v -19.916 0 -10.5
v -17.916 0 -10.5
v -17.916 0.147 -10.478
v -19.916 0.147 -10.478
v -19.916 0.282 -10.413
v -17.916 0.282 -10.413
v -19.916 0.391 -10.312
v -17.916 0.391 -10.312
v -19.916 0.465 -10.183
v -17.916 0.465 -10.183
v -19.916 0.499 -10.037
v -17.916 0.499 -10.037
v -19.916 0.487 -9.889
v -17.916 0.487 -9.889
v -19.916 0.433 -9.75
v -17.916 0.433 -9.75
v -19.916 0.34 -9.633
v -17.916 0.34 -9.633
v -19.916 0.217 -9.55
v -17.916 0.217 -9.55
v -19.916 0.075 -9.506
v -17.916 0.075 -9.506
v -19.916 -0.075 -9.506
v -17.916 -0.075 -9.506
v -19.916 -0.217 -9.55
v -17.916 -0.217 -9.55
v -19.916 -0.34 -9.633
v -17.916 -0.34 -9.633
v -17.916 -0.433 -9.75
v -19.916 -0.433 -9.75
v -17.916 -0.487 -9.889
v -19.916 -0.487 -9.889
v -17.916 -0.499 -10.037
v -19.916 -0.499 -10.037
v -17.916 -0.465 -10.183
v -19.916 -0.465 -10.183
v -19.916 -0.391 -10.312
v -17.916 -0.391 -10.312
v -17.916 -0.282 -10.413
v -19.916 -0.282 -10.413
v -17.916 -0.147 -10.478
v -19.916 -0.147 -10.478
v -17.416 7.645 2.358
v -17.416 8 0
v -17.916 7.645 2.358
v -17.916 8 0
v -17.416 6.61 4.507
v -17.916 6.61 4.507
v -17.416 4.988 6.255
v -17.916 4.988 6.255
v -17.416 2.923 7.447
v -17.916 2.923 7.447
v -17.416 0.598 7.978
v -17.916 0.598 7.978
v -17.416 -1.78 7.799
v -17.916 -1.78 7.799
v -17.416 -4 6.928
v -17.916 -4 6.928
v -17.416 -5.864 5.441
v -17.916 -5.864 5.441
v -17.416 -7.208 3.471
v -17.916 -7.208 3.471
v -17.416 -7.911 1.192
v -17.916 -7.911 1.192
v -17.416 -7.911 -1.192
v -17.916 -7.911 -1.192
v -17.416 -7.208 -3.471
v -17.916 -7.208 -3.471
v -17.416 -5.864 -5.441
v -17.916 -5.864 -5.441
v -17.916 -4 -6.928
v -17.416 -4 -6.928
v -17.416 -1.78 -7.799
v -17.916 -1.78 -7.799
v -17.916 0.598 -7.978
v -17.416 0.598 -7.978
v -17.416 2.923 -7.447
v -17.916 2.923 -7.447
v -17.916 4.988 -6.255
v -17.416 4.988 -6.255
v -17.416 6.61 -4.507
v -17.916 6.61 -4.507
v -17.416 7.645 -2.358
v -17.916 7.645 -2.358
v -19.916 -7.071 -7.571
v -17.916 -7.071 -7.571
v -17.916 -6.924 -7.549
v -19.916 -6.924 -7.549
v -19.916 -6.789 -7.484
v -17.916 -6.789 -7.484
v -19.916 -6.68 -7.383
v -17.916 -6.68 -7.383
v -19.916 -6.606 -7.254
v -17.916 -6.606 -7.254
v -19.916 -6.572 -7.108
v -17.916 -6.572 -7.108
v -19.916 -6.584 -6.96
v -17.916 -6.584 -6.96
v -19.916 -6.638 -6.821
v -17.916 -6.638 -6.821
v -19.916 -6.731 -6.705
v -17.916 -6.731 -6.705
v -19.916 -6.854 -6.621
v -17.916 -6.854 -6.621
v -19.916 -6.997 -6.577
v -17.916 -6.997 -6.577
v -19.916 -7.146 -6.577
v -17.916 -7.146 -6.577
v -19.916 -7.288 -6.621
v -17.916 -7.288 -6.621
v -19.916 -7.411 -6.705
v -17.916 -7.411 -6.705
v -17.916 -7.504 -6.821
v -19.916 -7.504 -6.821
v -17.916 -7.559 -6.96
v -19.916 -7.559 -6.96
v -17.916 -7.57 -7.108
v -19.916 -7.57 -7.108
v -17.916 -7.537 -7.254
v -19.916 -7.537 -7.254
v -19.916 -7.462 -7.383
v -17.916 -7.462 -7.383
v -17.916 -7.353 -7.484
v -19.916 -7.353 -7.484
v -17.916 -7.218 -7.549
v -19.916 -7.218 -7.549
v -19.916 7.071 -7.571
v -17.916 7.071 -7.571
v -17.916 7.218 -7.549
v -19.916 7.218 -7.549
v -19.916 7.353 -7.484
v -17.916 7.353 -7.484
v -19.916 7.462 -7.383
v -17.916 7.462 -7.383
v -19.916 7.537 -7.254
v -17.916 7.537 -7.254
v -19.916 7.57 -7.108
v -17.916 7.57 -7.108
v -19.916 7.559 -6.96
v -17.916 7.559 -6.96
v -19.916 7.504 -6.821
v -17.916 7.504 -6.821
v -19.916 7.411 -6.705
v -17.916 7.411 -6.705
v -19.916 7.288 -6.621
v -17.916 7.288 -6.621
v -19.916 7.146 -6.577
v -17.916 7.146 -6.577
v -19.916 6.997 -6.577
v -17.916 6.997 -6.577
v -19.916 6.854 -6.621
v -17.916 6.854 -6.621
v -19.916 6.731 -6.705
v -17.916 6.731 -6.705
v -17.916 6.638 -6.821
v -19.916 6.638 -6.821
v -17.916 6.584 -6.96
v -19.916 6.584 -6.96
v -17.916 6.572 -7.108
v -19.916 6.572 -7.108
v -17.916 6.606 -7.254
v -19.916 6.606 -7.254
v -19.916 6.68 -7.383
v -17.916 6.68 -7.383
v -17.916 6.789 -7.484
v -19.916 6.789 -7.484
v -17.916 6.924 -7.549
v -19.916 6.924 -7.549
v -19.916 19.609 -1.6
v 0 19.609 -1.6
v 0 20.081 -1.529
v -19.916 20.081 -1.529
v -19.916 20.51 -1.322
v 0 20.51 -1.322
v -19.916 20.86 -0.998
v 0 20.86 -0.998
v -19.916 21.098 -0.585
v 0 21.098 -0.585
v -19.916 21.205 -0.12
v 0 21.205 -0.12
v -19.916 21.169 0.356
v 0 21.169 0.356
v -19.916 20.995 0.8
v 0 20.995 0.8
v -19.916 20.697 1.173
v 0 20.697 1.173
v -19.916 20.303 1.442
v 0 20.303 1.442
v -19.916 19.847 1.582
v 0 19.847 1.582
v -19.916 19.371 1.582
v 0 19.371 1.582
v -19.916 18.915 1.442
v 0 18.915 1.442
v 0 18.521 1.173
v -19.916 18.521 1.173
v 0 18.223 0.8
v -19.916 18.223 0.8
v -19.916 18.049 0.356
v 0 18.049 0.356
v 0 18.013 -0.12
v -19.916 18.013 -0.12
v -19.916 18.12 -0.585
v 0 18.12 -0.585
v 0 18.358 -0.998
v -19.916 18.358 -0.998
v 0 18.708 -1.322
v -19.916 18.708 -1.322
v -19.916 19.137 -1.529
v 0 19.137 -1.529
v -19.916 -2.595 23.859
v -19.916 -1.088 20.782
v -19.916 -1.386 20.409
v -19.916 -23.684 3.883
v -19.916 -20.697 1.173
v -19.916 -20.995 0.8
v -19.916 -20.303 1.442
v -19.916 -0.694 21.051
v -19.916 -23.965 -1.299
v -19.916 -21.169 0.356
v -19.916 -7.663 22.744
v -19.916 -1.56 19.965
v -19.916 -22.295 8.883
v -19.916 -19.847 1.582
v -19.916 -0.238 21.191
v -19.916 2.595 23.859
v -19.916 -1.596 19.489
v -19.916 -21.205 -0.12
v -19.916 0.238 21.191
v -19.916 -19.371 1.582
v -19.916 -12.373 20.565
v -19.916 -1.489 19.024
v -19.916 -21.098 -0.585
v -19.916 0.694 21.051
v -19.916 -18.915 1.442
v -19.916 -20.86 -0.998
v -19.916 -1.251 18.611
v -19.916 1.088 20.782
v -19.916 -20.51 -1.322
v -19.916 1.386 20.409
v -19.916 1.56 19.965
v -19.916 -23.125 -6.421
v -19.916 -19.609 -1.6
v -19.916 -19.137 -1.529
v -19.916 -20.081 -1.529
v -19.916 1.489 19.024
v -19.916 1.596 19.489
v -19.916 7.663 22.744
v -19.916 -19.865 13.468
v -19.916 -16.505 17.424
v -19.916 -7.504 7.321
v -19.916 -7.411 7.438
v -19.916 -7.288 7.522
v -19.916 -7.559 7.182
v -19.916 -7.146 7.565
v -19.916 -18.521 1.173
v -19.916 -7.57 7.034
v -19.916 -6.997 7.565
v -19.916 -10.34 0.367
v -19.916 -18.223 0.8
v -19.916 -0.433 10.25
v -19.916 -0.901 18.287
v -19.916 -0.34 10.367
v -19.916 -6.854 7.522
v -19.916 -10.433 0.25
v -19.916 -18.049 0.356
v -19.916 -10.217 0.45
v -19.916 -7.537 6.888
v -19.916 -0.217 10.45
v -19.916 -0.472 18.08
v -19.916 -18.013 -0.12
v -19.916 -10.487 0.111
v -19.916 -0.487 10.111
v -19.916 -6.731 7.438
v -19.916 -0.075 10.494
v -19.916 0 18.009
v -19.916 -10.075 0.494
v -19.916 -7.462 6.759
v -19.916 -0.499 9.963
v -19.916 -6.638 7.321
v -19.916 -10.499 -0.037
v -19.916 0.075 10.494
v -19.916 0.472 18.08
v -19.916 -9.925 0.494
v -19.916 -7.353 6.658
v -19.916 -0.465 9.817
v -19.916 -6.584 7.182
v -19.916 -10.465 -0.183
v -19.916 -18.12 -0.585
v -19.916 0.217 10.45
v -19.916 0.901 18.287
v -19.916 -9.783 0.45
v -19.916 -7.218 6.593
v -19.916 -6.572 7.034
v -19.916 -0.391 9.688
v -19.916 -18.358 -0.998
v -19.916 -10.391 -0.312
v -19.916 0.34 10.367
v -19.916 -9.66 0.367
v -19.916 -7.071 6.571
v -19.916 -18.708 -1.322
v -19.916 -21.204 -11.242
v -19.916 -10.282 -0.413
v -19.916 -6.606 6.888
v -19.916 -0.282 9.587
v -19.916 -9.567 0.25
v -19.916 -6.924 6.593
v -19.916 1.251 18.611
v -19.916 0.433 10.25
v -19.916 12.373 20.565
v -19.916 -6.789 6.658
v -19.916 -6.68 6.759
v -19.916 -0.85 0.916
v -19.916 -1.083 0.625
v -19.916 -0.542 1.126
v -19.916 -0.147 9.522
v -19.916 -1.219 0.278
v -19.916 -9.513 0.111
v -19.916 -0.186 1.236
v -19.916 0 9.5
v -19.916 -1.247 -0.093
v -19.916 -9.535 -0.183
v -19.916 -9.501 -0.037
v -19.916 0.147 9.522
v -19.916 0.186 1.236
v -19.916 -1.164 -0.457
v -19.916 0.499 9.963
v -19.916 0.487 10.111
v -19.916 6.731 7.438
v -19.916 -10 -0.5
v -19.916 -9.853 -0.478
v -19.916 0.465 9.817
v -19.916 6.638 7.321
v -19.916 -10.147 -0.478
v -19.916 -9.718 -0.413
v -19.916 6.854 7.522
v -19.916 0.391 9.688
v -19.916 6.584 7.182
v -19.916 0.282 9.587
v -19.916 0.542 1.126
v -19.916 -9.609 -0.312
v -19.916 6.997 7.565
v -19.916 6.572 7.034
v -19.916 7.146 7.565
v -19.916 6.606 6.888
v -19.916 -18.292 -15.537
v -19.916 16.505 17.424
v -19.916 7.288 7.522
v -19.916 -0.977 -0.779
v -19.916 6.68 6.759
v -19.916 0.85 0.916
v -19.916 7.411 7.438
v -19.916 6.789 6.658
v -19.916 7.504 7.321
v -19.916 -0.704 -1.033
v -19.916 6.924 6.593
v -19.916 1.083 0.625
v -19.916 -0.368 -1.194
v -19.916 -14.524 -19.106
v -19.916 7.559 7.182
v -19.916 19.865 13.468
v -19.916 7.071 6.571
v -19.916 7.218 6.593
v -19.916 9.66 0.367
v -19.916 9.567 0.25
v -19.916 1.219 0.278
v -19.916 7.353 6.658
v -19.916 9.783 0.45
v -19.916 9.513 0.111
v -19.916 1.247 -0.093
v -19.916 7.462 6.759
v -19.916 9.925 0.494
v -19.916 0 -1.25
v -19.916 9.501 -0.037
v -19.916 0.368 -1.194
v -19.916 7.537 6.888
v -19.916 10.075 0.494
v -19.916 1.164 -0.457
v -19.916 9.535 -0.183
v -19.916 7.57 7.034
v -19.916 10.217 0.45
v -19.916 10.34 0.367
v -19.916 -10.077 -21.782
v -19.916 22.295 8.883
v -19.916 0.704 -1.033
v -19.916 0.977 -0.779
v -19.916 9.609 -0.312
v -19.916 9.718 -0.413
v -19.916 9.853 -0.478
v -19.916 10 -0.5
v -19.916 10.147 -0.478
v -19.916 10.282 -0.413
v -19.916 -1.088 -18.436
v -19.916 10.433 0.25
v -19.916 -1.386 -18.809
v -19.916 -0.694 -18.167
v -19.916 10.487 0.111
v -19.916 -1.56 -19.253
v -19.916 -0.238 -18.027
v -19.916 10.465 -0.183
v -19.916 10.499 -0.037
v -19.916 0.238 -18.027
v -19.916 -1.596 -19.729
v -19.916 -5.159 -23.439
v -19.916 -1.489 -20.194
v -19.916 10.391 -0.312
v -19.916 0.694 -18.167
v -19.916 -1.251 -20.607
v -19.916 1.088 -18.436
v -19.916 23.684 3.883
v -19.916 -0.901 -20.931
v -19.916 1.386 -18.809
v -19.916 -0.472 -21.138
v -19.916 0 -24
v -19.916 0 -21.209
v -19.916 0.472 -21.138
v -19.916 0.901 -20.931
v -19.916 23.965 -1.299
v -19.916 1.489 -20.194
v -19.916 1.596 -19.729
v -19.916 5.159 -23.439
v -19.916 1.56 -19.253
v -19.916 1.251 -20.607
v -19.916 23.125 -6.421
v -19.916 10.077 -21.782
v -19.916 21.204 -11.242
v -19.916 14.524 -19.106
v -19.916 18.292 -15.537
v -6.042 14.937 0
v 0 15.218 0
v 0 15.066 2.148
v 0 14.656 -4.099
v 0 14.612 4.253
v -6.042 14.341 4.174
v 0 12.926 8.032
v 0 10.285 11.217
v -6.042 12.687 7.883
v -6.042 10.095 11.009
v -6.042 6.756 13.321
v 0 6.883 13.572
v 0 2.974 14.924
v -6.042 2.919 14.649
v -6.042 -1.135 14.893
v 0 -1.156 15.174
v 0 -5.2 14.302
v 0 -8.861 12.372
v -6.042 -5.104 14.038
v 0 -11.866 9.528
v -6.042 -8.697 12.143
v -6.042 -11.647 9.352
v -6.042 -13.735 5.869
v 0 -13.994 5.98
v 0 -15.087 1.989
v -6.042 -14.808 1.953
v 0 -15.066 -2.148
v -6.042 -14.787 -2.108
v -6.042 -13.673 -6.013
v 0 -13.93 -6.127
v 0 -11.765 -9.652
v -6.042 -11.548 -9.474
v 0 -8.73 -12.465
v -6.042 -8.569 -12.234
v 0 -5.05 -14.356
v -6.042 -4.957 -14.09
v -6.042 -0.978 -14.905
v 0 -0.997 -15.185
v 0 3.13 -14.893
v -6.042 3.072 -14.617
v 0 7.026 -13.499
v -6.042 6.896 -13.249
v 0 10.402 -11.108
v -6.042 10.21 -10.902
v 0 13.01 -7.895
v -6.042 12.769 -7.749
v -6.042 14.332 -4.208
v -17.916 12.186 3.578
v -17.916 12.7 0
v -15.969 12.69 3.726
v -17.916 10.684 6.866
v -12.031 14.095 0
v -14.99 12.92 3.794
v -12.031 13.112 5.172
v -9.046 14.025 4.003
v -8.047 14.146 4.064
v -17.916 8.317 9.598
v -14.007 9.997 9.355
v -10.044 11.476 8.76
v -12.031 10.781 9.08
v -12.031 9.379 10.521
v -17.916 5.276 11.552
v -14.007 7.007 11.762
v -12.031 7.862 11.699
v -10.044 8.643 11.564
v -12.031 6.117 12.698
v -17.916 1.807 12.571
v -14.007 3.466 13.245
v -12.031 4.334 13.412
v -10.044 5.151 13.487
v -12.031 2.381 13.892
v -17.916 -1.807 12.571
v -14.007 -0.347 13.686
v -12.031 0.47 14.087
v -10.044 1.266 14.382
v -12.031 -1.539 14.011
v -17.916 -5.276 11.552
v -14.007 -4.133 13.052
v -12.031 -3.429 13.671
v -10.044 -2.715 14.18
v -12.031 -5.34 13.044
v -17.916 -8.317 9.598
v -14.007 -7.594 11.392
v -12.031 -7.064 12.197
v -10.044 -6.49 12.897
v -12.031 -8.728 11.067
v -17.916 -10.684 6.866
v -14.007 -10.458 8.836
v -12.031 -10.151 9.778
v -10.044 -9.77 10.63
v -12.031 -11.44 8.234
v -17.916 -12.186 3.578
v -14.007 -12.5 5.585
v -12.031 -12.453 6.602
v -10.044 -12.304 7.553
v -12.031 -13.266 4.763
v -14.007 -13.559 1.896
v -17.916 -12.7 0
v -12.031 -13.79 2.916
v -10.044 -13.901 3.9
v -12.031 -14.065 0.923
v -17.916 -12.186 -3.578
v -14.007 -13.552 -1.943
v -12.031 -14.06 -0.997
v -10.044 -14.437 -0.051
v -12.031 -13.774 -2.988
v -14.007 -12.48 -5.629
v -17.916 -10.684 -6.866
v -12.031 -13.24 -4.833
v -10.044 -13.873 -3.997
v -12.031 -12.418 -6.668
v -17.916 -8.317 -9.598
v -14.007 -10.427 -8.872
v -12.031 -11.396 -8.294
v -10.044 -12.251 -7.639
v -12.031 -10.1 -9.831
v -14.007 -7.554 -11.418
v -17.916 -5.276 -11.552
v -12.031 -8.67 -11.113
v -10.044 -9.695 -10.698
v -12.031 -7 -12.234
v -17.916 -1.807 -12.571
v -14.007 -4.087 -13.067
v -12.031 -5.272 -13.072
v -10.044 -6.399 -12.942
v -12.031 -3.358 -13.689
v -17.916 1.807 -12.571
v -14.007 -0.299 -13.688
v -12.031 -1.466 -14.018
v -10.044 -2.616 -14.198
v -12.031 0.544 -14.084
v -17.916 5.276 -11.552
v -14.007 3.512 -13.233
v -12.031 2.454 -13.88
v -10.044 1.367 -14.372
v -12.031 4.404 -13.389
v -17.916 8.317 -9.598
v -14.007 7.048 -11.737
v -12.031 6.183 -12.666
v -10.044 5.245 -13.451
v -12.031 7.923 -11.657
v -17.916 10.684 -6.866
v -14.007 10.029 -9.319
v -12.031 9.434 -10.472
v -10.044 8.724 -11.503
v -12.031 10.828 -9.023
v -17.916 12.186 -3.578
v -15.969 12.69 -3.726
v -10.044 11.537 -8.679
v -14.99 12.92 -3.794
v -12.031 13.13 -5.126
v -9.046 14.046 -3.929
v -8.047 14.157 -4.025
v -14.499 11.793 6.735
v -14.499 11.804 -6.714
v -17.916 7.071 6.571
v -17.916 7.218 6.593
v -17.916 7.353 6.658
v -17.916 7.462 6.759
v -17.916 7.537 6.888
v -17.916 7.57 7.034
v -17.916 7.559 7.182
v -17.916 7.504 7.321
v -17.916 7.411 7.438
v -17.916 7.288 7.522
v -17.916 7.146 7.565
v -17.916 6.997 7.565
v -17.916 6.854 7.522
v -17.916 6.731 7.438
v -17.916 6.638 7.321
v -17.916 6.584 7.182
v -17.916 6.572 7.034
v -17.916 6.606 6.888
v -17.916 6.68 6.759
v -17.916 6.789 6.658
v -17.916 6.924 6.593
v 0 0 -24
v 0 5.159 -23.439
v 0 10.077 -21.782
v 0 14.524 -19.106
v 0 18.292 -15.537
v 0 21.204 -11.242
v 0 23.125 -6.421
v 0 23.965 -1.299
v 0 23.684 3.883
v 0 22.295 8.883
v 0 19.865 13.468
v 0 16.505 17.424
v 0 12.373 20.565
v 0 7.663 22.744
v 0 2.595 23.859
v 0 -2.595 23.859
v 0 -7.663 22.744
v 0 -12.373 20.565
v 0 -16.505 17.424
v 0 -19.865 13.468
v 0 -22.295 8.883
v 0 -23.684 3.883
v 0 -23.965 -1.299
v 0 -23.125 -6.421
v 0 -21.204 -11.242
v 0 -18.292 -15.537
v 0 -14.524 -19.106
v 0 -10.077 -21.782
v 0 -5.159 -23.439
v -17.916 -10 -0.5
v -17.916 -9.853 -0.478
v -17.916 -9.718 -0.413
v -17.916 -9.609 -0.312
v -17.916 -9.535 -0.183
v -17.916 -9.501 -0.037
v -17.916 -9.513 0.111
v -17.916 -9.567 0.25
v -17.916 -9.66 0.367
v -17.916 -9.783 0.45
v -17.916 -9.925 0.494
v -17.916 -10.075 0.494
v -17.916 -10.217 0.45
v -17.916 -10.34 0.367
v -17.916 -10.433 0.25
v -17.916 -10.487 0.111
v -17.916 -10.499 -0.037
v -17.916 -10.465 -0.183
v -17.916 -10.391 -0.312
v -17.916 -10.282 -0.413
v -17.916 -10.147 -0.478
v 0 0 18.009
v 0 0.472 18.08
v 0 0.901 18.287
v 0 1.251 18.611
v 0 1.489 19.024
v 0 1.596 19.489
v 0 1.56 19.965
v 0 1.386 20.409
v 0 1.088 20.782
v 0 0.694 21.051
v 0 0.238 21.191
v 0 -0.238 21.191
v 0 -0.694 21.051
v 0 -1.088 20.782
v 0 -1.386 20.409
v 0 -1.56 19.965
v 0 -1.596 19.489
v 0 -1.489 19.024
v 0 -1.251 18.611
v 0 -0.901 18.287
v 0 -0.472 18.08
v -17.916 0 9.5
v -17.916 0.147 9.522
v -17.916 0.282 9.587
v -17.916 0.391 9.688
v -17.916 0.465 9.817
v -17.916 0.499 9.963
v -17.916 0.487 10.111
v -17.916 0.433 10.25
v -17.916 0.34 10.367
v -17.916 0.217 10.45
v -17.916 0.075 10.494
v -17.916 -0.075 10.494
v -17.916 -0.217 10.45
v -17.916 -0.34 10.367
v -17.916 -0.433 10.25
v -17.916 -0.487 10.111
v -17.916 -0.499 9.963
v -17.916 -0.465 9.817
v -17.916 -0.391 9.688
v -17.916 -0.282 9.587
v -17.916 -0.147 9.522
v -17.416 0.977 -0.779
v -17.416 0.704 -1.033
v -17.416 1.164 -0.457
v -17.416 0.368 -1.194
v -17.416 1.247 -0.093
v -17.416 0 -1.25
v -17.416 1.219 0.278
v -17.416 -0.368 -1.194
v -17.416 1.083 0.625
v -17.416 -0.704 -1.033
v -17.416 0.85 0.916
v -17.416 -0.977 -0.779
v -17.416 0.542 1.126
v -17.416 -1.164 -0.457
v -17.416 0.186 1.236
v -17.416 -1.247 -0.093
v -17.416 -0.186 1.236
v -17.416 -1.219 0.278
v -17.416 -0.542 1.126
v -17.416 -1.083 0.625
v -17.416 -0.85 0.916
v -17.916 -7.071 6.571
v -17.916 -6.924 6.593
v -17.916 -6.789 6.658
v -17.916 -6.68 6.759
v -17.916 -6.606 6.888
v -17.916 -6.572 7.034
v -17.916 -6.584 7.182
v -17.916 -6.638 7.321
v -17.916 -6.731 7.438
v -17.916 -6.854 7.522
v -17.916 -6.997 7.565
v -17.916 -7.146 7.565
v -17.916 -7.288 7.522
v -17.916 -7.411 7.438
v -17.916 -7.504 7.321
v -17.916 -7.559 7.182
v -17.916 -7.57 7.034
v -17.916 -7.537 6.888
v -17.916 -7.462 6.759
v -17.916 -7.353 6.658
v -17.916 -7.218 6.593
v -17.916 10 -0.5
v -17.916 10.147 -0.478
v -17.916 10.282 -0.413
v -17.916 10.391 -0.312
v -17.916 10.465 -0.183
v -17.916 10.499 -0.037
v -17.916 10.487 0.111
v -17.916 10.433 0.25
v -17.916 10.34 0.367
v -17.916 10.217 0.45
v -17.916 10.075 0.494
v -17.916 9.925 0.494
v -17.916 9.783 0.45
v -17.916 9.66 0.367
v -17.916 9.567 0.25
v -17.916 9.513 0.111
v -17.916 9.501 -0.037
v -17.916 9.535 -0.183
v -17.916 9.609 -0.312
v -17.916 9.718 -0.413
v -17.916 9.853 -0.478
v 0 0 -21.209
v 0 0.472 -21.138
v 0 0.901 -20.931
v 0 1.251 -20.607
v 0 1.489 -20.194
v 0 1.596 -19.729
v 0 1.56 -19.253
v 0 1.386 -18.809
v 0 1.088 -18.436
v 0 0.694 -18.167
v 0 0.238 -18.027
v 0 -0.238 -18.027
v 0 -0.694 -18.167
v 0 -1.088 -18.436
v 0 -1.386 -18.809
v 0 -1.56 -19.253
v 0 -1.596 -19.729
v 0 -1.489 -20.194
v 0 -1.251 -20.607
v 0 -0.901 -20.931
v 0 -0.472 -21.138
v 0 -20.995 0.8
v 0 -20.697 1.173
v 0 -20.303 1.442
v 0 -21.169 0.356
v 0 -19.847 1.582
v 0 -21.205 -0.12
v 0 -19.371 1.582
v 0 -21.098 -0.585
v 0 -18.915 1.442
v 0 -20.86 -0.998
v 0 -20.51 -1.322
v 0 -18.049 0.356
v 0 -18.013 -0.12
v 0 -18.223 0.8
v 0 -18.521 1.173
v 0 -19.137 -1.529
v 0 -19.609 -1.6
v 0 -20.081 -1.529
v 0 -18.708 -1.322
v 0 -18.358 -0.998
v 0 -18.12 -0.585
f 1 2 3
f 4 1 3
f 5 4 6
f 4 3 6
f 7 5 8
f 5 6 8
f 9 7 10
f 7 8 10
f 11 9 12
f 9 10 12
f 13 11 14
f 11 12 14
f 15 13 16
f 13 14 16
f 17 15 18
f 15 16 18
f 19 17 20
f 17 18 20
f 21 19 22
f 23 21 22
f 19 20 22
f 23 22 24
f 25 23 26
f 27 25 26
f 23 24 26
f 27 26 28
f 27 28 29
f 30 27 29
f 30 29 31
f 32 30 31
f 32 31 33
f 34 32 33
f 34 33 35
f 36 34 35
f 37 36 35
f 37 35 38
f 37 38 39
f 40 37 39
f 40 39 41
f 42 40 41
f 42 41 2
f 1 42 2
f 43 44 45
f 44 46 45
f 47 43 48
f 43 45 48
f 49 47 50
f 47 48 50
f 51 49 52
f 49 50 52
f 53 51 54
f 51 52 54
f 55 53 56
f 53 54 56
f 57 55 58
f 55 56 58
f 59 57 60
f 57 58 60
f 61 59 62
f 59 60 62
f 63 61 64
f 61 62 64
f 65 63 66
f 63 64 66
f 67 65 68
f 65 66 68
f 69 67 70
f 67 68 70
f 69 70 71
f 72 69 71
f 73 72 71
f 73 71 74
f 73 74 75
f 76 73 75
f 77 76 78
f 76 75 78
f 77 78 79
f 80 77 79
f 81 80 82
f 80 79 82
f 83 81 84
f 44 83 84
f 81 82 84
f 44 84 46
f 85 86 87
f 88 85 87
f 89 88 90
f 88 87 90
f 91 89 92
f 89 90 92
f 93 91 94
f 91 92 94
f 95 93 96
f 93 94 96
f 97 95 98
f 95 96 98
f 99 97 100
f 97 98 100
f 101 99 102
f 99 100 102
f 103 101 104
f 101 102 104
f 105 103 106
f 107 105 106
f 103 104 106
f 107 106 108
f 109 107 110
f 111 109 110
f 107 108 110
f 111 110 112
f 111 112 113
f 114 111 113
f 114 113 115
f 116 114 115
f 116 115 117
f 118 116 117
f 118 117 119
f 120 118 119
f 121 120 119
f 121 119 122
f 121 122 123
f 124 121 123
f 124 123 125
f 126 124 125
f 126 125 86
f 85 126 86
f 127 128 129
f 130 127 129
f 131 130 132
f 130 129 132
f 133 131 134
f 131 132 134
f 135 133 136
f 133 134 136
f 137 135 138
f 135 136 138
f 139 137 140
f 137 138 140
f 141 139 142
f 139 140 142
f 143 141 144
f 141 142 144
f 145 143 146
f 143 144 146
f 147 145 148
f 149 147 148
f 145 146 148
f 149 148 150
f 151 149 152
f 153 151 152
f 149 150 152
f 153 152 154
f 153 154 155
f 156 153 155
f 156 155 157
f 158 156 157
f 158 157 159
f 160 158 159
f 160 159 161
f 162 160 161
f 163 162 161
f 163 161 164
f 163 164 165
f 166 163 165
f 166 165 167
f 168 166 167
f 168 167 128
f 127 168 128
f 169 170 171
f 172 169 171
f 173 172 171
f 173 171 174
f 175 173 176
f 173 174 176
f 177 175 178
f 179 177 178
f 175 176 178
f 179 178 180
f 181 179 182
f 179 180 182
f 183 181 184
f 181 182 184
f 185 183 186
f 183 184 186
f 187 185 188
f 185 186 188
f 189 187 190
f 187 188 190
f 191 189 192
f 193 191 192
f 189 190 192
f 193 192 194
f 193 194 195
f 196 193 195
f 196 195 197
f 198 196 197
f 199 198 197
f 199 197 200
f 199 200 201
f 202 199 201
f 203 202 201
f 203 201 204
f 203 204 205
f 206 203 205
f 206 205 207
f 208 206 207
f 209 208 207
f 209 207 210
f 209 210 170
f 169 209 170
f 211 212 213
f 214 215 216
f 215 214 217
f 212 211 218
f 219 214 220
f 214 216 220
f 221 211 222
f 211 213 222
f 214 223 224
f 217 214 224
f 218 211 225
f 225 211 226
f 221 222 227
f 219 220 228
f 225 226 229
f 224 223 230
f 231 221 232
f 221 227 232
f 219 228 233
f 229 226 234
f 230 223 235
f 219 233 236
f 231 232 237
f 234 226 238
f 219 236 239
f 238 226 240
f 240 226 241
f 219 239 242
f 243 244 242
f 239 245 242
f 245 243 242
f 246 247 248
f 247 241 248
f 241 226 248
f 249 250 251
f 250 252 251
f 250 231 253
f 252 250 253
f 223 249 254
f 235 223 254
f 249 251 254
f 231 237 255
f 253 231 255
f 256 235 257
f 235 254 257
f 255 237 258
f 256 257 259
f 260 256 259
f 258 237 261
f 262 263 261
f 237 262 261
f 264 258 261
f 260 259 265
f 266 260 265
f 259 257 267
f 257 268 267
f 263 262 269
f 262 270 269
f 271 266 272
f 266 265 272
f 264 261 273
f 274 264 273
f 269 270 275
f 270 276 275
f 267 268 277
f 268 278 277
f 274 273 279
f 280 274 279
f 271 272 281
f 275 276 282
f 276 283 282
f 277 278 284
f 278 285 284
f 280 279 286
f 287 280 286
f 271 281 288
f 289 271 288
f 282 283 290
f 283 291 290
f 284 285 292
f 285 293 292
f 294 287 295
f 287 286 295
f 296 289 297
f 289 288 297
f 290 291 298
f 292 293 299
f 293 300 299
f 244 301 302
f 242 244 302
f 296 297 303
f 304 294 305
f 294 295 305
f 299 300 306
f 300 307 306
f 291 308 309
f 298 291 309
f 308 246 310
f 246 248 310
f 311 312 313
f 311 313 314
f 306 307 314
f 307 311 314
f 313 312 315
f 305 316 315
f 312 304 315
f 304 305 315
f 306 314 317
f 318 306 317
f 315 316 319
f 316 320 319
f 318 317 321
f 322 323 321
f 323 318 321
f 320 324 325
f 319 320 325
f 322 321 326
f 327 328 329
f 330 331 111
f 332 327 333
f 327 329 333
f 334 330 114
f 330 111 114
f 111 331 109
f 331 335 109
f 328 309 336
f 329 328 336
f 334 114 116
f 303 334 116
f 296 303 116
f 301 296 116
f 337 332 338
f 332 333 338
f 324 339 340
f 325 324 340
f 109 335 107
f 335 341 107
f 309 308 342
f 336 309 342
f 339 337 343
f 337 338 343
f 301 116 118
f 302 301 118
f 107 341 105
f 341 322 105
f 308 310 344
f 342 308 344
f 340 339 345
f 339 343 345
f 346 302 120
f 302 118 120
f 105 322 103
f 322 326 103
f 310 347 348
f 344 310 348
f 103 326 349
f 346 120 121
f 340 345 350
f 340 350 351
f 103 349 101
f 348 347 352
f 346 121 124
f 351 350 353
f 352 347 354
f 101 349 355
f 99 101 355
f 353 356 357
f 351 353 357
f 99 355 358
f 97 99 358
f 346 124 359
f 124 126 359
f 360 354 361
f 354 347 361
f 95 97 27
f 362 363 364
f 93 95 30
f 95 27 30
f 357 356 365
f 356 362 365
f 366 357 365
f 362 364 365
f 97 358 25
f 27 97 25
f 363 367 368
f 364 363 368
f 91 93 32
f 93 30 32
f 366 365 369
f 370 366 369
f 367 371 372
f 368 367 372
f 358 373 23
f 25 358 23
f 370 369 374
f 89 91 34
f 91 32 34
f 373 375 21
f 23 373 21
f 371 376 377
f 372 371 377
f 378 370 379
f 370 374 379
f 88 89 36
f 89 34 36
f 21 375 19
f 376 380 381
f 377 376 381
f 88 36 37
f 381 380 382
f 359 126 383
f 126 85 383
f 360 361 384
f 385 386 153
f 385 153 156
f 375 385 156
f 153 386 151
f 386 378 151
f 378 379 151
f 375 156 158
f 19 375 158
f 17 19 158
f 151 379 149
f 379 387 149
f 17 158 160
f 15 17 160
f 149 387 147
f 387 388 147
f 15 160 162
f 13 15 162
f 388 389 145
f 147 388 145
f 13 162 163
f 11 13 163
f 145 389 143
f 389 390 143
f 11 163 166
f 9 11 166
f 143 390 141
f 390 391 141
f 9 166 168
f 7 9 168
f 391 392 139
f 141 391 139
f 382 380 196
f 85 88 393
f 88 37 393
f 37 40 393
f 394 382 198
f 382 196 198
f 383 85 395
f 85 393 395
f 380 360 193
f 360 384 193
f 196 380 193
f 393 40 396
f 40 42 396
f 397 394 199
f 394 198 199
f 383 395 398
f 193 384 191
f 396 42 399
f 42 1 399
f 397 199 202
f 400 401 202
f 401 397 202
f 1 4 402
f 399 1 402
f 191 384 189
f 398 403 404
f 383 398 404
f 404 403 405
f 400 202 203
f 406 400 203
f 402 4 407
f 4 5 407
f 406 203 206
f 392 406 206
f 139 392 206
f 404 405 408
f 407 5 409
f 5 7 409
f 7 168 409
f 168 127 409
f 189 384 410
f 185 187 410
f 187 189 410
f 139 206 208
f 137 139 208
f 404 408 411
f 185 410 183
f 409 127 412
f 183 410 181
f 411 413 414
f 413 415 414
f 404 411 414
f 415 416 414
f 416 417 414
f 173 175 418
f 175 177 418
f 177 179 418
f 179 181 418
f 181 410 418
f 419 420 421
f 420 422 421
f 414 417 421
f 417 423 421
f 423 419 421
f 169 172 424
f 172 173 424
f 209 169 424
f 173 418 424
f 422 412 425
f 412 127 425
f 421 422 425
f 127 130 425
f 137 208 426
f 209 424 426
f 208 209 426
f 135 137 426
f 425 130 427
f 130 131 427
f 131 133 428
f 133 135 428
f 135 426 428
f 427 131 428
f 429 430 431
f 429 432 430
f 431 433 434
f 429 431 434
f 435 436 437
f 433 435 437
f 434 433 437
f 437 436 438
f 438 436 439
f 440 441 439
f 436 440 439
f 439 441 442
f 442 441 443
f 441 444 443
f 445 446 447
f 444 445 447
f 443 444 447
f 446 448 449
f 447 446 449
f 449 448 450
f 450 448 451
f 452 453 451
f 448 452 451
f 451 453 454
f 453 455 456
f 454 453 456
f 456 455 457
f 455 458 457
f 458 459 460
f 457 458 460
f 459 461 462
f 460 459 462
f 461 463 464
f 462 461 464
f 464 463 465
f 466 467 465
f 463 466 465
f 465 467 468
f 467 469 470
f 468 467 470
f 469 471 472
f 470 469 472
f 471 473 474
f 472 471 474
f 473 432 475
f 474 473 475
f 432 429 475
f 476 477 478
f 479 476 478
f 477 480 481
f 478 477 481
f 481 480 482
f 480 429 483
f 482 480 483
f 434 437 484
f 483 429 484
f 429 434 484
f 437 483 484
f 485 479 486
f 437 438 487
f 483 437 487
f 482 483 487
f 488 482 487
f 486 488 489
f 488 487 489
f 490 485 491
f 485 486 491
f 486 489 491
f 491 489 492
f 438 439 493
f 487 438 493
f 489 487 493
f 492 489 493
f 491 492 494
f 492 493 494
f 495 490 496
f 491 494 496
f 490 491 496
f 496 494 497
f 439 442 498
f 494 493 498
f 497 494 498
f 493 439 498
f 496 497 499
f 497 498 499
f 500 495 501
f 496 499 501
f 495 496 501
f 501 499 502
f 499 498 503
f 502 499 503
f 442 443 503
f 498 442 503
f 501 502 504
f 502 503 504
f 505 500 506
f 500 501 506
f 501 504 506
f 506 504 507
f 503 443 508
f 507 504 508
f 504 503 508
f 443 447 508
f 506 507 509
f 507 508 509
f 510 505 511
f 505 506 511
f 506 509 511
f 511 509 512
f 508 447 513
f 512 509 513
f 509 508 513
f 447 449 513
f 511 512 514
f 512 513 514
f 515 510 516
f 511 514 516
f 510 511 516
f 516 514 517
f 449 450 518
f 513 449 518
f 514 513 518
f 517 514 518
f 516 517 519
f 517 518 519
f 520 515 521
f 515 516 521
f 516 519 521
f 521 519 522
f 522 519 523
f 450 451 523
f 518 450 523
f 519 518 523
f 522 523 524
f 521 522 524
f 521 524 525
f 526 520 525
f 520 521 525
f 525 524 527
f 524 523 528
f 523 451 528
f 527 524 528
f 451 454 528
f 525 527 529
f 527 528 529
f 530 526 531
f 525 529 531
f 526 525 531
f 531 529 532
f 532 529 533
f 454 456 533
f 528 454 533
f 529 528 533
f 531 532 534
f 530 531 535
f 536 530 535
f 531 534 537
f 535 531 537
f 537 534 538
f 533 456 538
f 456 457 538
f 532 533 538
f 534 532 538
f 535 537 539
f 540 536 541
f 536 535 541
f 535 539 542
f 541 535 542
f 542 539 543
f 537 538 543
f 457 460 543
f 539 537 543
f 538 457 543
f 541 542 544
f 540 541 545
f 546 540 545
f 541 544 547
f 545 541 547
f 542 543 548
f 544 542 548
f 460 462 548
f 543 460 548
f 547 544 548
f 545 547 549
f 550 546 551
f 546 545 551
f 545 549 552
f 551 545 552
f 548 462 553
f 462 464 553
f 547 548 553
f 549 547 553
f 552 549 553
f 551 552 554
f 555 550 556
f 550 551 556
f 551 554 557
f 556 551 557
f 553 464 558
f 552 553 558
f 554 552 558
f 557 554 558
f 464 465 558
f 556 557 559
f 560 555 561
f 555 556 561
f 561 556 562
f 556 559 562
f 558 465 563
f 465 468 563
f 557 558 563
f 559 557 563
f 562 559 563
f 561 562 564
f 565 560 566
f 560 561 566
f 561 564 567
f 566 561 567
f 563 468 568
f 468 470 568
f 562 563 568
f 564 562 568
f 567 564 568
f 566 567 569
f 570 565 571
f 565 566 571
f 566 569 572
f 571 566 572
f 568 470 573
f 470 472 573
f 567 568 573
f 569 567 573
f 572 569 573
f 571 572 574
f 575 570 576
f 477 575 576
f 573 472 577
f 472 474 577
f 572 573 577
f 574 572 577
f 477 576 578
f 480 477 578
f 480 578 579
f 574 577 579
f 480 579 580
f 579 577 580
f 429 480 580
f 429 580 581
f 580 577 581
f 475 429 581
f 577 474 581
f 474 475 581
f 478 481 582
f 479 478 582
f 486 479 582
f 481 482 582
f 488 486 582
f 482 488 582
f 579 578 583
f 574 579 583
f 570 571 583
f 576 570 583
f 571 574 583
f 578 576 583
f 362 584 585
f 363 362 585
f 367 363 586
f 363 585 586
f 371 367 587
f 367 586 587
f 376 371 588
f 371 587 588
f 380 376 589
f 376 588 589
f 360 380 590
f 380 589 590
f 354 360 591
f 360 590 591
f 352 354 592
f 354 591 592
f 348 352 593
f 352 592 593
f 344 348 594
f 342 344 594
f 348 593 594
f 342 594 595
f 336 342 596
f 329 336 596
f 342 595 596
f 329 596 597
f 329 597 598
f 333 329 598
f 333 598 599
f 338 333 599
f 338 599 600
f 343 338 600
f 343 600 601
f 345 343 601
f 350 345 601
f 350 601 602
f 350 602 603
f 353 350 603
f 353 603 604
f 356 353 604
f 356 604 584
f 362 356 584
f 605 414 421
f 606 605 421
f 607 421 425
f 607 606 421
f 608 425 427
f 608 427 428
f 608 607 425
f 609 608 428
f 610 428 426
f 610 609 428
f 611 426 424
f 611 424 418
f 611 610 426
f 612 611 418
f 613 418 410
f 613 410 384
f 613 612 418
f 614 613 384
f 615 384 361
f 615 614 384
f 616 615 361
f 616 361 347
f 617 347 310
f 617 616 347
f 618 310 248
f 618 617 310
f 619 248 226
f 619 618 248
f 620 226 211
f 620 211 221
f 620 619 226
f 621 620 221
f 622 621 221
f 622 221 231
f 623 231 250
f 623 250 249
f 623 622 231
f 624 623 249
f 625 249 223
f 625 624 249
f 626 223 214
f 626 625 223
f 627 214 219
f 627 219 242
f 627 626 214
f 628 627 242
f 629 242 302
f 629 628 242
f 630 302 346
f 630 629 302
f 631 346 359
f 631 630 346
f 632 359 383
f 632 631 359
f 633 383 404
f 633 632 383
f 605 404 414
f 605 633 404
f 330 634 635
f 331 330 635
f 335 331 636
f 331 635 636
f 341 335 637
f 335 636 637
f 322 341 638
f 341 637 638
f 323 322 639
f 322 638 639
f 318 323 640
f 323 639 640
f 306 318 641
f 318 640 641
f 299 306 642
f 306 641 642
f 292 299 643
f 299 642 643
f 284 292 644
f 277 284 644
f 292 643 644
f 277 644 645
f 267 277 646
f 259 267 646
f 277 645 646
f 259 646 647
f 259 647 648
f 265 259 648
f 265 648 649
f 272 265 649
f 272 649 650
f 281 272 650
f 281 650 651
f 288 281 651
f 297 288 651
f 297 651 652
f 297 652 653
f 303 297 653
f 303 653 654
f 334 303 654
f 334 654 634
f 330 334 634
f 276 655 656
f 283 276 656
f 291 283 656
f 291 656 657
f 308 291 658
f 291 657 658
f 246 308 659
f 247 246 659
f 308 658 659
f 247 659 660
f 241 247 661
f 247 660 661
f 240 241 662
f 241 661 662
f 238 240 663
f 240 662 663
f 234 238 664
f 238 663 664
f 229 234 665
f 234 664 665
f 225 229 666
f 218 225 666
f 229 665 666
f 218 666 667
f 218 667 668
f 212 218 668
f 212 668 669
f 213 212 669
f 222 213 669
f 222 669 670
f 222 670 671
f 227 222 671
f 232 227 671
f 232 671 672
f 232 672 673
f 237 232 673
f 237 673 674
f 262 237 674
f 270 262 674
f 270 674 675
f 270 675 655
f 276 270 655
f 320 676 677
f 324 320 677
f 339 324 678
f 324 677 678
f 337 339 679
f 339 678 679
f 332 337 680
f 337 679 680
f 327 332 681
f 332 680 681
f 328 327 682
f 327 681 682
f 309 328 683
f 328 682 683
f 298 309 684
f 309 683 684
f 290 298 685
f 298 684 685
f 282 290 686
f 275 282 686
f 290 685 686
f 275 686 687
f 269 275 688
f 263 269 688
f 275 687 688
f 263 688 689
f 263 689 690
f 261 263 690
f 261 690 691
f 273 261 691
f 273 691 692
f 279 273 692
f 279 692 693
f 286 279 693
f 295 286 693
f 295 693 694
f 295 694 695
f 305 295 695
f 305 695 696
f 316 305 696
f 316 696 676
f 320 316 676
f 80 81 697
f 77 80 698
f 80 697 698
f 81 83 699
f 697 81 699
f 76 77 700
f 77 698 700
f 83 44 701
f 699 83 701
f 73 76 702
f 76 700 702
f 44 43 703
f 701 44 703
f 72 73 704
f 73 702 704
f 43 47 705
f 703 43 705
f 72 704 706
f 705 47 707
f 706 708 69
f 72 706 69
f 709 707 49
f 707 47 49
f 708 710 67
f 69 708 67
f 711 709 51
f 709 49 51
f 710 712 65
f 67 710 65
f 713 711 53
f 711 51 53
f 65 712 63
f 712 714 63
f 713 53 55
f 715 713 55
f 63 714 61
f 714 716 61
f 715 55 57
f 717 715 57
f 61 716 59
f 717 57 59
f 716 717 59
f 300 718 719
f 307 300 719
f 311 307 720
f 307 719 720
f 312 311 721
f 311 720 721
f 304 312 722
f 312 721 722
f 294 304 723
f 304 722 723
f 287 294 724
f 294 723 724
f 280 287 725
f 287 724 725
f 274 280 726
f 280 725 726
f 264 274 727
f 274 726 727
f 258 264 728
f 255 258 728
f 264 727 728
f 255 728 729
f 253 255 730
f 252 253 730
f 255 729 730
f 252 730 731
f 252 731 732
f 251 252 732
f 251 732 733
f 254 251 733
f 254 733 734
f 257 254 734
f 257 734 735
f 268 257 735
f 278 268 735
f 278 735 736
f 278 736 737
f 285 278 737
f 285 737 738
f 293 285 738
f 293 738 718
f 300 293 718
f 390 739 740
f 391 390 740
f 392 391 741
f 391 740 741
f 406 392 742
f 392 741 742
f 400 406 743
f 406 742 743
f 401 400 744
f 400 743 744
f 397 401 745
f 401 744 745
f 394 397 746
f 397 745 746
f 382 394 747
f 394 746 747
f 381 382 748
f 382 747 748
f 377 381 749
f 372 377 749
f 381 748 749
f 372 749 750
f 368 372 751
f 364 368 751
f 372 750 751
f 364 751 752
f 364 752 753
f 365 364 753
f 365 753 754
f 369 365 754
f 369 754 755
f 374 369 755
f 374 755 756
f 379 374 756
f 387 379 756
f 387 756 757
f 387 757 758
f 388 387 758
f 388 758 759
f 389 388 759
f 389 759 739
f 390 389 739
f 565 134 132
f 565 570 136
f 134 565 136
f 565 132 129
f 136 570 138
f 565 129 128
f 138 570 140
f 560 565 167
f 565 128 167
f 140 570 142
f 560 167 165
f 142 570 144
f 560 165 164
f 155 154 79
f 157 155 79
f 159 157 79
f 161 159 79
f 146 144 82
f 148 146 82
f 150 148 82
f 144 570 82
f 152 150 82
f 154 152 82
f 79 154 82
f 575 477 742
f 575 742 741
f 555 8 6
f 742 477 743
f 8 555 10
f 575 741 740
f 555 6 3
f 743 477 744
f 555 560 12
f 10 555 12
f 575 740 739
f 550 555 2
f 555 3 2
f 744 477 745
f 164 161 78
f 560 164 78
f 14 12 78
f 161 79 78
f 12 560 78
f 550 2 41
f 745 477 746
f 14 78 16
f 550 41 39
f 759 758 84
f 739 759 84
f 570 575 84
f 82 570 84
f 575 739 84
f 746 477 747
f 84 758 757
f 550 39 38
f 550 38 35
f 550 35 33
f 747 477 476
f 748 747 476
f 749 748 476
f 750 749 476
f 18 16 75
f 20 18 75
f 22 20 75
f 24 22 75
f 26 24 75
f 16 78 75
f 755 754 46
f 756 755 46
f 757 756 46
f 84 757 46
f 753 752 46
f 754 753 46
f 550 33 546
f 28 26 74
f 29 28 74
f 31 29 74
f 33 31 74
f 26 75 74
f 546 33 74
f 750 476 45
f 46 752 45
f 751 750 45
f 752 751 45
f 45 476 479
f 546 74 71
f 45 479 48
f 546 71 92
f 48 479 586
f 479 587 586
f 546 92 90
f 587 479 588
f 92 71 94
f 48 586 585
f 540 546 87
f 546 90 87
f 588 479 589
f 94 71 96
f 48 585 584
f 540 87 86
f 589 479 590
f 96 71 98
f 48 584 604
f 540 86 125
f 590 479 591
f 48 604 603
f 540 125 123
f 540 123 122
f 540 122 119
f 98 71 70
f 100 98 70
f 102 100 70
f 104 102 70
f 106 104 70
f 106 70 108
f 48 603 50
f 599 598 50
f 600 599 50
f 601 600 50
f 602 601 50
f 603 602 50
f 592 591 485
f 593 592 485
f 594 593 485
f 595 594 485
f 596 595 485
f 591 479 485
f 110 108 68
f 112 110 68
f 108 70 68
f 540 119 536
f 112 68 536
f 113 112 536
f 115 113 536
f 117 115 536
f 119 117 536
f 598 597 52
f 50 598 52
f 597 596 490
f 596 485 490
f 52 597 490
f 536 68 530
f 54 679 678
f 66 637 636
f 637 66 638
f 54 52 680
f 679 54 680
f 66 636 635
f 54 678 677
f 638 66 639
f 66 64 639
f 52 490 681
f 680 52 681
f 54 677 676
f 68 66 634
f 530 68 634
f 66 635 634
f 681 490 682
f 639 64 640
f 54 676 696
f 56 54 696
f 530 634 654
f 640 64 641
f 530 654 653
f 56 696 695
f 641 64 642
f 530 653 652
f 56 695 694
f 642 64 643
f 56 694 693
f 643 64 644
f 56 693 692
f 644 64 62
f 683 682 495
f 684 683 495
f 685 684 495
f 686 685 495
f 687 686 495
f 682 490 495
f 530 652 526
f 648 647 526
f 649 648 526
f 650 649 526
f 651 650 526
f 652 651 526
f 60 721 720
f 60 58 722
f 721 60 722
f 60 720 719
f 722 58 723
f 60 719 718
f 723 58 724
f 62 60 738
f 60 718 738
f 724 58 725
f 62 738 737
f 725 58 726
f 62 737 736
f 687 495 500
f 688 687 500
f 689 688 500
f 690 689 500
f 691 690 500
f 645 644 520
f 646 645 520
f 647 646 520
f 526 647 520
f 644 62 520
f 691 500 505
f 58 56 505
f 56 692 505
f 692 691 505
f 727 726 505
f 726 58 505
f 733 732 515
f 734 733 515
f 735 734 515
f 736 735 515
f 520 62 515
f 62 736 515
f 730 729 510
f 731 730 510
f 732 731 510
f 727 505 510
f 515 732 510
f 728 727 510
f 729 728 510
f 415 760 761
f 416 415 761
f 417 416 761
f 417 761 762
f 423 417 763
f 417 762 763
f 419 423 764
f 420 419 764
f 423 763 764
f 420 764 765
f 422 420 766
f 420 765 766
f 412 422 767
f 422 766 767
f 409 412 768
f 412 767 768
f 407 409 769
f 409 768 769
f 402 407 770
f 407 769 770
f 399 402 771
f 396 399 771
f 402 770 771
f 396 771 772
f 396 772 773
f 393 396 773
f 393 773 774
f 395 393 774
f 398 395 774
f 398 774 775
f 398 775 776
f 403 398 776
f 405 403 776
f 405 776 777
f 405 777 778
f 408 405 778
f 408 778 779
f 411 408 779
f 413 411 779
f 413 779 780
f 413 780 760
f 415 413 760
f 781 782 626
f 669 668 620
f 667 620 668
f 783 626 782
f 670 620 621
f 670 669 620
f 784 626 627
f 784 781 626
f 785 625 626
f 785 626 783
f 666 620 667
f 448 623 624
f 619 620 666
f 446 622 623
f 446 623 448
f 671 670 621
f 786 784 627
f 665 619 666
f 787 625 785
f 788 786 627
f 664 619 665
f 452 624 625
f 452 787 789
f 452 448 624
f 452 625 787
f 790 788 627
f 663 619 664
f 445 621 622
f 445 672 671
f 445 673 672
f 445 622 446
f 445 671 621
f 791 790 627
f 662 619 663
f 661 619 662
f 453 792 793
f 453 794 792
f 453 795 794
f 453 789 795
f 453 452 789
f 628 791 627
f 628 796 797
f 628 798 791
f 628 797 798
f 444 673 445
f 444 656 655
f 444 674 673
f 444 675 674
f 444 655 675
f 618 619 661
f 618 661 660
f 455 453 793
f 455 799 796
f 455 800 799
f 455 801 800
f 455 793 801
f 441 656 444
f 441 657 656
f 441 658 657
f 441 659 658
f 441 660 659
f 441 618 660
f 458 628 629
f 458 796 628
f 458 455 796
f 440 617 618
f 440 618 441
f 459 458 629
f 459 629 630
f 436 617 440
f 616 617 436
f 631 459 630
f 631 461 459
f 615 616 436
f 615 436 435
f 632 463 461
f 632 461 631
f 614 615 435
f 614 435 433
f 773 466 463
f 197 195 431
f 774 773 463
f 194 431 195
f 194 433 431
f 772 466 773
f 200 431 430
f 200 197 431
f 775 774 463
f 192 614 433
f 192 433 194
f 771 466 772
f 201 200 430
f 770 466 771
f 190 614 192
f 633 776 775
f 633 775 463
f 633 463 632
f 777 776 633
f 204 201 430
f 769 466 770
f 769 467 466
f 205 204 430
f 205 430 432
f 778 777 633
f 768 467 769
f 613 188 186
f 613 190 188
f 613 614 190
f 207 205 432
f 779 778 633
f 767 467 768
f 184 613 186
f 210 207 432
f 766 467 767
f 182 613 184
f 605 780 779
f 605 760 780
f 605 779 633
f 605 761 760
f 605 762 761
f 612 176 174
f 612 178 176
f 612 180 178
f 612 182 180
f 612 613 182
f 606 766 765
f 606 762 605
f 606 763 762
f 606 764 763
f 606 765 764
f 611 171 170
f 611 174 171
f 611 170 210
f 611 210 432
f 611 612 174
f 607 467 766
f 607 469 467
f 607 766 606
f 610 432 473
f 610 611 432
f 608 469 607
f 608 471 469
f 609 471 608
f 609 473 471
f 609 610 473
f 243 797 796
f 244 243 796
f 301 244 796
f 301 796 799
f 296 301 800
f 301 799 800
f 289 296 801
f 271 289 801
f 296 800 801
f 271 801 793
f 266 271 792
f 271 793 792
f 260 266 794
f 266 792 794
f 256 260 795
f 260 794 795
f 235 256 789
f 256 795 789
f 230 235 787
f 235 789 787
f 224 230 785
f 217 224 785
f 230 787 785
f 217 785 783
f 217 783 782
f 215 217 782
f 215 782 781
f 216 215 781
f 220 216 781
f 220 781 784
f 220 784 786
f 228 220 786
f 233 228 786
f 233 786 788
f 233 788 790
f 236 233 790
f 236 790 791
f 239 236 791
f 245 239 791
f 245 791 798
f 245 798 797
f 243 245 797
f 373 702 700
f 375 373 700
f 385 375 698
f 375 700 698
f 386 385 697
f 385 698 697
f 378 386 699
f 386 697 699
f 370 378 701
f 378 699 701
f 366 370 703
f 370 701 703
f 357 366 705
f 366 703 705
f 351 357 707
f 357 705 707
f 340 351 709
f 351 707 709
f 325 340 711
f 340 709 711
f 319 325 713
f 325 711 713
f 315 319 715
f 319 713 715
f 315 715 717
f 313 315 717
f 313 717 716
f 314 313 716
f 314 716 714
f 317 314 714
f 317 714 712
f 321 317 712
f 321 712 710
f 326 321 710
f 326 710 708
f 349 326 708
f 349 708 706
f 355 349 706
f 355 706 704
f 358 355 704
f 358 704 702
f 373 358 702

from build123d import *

# Parameters (mm, degrees)
SKETCH2_R           = 24
BOSS_EXTRUDE1_DEPTH = 19.916428128
SKETCH3_R           = 1.25
CUT_EXTRUDE1_DEPTH  = 40.353070007
SKETCH4_R           = 1.6
CUT_EXTRUDE2_DEPTH  = 40.353070007
SKETCH5_R           = 0.5
CUT_EXTRUDE3_DEPTH  = 39.148813636


# Read off the part's stored shape, not the designer's step: Roller coating 12, Roller core 12 coated
with BuildPart() as part:
    # Roller coating 12 outline → Roller coating 12 (revolve)
    with BuildSketch(Plane.YX):
        with BuildLine():
            ThreePointArc((12.7, -17.916428128), (15.217989764, 0), (12.7, 17.916428128))
            Line((12.7, 17.916428128), (8, 17.916428128))
            Line((8, 17.916428128), (8, 17.416428128))
            Line((8, 17.416428128), (12.322080058, 17.416428128))
            ThreePointArc((12.322080058, 17.416428128), (14.717989764, 0), (12.322080058, -17.416428128))
            Line((12.322080058, -17.416428128), (8, -17.416428128))
            Line((8, -17.416428128), (8, -17.916428128))
            Line((8, -17.916428128), (12.7, -17.916428128))
        make_face()
    revolve(axis=Axis((0, 0, 0), (1, 0, 0)))


with BuildPart() as body_2:
    # Roller core 12 coated outline → Roller core 12 coated (revolve)
    with BuildSketch(Plane.YX):
        with BuildLine():
            Line((1.25, 17.416428128), (1.25, -17.416428128))
            Line((1.25, -17.416428128), (12.322080058, -17.416428128))
            ThreePointArc((12.322080058, -17.416428128), (14.717989764, 0), (12.322080058, 17.416428128))
            Line((12.322080058, 17.416428128), (1.25, 17.416428128))
        make_face()
    revolve(axis=Axis((0, 0, 0), (1, 0, 0)))


with BuildPart() as part_1:
    add(part.part)

    # Combine1: union body 2
    add(body_2.part)


with BuildPart() as body_2_2:
    # Sketch2 → Boss-Extrude1 (new body)
    with BuildSketch(Plane(origin=(0, 0, 0), x_dir=(0, 0, -1), z_dir=(1, 0, 0))):
        Circle(SKETCH2_R)
    extrude(amount=-BOSS_EXTRUDE1_DEPTH)

    # Combine2: cut part
    add(part_1.part, mode=Mode.SUBTRACT)

    # Sketch3 → Cut-Extrude1 (cut, through all)
    with BuildSketch(Plane(origin=(0, 0, 0), x_dir=(0, 0, -1), z_dir=(1, 0, 0))):
        Circle(SKETCH3_R)
    extrude(amount=-CUT_EXTRUDE1_DEPTH, mode=Mode.SUBTRACT)

    # Sketch4 → Cut-Extrude2 (cut, through all)
    with BuildSketch(Plane(origin=(0, 0, 0), x_dir=(0, 0, -1), z_dir=(1, 0, 0))):
        with Locations((0, 19.608994882)):
            Circle(SKETCH4_R)
        with Locations((-19.608994882, 0)):
            Circle(SKETCH4_R)
        with Locations((0, -19.608994882)):
            Circle(SKETCH4_R)
        with Locations((19.608994882, 0)):
            Circle(SKETCH4_R)
    extrude(amount=-CUT_EXTRUDE2_DEPTH, mode=Mode.SUBTRACT)

    # Sketch5 → Cut-Extrude3 (cut, through all)
    with BuildSketch(Plane(origin=(-17.416428128, 0, 0), x_dir=(0, 0, -1), z_dir=(1, 0, 0))):
        with Locations((-7.071067812, 7.071067812)):
            Circle(SKETCH5_R)
        with Locations((0, 10)):
            Circle(SKETCH5_R)
        with Locations((-10, 0)):
            Circle(SKETCH5_R)
        with Locations((0, -10)):
            Circle(SKETCH5_R)
        with Locations((10, 0)):
            Circle(SKETCH5_R)
        with Locations((7.071067812, 7.071067812)):
            Circle(SKETCH5_R)
        with Locations((-7.071067812, -7.071067812)):
            Circle(SKETCH5_R)
        with Locations((7.071067812, -7.071067812)):
            Circle(SKETCH5_R)
    extrude(amount=-CUT_EXTRUDE3_DEPTH, mode=Mode.SUBTRACT)


solid = body_2_2.part
